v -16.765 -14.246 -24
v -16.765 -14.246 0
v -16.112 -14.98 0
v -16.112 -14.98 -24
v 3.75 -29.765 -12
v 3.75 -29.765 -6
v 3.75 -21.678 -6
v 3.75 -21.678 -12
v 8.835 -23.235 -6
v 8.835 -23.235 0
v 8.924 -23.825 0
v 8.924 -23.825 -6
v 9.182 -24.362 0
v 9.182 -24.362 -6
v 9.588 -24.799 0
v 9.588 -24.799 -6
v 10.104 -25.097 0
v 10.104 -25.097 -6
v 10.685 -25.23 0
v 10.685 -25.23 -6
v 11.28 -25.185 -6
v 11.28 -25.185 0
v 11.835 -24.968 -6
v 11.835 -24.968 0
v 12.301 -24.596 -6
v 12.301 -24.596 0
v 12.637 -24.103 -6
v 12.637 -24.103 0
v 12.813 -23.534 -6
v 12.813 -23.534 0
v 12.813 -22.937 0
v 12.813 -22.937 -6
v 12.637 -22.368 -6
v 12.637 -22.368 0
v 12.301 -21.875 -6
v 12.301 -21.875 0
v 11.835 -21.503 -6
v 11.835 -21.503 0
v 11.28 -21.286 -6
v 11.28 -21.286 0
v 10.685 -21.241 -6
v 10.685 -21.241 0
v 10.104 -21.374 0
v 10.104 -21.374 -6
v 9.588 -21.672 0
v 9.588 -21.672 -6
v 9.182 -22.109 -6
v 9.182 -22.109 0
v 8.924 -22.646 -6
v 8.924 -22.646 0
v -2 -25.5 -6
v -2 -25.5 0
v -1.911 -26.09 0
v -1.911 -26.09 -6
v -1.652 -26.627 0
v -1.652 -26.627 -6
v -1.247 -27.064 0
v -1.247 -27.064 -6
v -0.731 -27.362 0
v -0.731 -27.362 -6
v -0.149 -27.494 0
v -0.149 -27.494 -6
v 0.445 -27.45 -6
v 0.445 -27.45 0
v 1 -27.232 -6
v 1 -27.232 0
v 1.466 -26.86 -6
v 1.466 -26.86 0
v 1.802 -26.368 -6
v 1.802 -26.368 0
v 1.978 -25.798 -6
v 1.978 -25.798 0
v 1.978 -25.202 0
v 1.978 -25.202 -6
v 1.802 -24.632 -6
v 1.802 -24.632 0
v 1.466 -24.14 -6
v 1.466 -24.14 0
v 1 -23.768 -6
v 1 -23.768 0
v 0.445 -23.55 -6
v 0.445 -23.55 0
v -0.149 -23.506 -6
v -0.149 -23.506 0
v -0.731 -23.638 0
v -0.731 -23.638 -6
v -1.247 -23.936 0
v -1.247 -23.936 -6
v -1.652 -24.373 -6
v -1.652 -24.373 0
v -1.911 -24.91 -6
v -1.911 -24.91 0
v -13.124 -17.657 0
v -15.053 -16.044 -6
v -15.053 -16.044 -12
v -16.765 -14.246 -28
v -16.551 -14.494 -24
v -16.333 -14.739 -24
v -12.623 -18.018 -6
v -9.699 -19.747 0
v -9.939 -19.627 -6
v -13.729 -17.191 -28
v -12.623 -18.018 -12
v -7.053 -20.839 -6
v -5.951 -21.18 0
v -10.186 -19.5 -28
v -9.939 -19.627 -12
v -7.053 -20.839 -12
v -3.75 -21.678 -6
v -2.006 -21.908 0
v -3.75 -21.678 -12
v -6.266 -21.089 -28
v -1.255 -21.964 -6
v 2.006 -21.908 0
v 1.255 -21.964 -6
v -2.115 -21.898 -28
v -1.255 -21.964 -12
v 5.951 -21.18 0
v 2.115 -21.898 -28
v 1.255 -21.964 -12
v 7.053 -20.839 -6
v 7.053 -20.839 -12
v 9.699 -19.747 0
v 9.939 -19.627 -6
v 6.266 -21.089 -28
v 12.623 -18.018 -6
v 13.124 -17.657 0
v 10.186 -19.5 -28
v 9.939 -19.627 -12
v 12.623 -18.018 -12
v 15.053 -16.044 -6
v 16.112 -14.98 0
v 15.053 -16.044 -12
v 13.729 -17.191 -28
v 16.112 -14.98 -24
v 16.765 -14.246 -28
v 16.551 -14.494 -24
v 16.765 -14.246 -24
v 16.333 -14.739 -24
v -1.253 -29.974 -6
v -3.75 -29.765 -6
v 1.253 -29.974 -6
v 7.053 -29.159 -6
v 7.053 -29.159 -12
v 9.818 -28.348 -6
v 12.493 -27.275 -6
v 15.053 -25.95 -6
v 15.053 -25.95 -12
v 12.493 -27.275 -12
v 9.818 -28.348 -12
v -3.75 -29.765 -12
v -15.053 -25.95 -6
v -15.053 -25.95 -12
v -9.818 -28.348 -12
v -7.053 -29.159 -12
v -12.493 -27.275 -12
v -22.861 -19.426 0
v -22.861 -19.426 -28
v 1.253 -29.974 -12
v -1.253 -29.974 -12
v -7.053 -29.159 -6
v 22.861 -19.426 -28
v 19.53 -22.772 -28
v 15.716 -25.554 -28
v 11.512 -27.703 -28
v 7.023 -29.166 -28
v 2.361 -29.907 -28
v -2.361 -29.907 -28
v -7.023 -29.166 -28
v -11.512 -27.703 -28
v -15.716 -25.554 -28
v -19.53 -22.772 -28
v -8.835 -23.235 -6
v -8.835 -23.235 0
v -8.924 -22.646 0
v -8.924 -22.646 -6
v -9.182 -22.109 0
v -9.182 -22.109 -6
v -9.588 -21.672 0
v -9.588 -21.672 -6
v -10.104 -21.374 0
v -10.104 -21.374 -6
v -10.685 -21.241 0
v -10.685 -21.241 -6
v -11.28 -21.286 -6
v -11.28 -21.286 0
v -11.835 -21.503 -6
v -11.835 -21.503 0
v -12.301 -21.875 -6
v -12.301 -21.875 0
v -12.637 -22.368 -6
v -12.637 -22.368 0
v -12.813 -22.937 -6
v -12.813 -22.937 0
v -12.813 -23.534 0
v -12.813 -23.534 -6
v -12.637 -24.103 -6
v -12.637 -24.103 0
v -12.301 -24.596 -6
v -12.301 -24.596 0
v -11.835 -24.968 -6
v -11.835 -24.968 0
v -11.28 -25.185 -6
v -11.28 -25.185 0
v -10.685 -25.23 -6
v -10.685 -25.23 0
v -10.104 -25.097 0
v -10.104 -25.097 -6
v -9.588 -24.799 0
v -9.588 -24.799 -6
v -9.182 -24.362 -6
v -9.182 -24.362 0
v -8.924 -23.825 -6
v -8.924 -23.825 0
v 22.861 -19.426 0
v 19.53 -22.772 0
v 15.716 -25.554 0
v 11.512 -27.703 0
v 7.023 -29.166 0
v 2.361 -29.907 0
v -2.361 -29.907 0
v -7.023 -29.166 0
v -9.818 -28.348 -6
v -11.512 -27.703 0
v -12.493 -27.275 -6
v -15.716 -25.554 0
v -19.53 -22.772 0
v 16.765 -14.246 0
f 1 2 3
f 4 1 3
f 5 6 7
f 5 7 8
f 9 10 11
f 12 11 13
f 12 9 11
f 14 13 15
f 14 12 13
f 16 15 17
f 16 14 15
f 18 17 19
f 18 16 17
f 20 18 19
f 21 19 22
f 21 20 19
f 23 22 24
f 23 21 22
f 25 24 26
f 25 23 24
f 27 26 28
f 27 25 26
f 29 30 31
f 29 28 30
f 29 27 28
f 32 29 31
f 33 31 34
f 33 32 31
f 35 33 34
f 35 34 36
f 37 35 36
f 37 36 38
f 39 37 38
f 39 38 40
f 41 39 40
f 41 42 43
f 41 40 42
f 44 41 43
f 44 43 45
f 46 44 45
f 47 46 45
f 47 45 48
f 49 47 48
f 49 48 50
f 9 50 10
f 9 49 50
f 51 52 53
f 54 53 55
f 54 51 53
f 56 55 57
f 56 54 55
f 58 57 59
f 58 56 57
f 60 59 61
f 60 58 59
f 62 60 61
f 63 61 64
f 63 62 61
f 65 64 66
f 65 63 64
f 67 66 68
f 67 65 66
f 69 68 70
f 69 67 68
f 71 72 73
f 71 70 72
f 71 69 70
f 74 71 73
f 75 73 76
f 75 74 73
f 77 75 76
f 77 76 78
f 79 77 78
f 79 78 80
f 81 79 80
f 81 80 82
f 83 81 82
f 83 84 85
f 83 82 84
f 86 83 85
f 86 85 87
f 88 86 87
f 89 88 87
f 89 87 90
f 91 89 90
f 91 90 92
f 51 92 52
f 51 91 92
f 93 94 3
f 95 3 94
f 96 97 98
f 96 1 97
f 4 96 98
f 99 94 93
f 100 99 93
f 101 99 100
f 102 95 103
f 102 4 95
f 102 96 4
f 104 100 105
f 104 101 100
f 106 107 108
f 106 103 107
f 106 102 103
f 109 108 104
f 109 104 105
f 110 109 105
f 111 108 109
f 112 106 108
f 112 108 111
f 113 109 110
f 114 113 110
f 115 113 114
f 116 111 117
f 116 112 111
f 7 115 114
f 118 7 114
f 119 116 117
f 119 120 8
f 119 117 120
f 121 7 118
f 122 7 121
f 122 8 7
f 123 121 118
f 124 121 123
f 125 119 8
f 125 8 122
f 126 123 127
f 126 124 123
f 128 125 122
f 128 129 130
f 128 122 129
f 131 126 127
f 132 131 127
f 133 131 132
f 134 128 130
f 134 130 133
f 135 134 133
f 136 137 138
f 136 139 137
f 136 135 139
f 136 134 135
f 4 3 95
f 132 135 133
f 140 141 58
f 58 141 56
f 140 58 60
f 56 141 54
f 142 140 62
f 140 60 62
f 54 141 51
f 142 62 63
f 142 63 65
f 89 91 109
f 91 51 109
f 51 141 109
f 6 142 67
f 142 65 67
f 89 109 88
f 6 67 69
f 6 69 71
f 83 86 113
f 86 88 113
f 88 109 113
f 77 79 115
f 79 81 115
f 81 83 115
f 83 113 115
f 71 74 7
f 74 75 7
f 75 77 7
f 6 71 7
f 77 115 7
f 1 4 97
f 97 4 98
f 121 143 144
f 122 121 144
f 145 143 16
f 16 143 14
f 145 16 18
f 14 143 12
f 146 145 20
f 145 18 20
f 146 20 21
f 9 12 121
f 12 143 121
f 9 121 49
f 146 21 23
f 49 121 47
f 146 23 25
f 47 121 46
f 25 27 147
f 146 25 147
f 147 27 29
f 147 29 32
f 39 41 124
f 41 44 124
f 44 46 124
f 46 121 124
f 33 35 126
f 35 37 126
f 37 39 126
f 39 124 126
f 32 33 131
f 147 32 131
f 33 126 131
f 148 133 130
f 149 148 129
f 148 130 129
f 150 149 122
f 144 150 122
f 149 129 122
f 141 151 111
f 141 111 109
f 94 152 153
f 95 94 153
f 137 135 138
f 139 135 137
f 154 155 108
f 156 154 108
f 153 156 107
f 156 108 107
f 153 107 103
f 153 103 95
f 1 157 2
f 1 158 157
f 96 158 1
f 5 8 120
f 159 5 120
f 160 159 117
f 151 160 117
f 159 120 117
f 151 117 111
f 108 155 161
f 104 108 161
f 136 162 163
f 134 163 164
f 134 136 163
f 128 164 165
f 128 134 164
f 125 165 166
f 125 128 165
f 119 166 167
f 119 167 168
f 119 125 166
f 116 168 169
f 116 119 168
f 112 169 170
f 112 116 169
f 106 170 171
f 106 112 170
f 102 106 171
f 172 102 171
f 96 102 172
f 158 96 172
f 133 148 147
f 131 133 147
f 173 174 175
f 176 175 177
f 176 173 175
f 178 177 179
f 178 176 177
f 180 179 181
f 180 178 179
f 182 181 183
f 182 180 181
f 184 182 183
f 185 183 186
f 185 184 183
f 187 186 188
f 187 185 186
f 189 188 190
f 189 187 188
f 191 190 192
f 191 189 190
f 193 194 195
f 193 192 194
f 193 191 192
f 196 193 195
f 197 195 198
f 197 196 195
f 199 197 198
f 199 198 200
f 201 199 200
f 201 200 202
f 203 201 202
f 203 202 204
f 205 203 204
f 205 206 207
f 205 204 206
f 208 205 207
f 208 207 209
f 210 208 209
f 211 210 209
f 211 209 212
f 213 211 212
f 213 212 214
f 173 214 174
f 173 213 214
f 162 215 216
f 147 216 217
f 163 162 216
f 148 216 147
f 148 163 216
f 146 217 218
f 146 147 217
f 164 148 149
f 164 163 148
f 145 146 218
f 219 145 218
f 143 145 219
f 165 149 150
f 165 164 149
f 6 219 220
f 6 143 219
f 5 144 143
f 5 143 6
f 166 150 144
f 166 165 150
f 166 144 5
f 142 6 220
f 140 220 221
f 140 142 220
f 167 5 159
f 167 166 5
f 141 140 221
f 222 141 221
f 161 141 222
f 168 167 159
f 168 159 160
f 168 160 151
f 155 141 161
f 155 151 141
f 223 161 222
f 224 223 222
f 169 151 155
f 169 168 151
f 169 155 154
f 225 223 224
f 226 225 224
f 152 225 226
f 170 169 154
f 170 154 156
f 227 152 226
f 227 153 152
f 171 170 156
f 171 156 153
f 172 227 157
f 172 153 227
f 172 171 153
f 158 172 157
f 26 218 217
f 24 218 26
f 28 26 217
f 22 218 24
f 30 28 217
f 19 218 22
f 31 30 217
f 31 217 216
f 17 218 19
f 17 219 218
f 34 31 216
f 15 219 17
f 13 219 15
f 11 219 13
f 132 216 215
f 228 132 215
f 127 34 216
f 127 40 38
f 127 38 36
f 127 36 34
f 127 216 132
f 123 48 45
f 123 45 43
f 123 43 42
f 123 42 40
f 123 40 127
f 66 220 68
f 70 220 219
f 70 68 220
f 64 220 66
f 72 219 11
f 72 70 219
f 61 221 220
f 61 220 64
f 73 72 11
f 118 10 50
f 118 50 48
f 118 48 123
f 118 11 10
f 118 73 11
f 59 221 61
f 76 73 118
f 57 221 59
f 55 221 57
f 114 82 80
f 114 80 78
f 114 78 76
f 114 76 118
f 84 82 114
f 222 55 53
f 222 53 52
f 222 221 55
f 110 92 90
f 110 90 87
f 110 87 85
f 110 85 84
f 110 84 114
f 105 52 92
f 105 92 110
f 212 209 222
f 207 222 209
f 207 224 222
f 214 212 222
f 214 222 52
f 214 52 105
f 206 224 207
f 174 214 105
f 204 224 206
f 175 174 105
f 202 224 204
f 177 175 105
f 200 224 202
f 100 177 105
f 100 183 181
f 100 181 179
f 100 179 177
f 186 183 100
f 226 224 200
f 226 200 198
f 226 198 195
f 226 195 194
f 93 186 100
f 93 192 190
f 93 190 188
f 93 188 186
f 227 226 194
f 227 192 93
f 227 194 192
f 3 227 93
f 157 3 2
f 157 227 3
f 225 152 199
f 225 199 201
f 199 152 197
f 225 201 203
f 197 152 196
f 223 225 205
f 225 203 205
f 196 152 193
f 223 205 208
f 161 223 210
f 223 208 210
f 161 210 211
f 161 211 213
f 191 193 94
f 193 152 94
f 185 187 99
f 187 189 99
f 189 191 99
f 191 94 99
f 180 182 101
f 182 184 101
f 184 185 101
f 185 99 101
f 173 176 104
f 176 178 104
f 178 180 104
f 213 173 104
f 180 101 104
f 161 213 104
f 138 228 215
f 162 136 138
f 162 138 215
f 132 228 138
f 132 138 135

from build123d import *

# Parameters (mm, degrees)
SKETCH_1_R                = 20
SKETCH_1_R_2              = 2
EXTRUDE_1_DEPTH           = 4
EXTRUDE_START             = -4
EXTRUDE_2_DEPTH           = 4
FILLET_2_R                = 5
FILLET_3_R                = 5
SKETCH_3_R                = 58.160089131
SKETCH_3_R_2              = 39.60449563
CUT_EXTRUDE_1_DEPTH       = 4
FILLET_4_R                = 8
EXTRUDE_3_DEPTH           = 4
SKETCH_5_R                = 2
CUT_EXTRUDE_2_DEPTH       = 4
SKETCH_6_R                = 2
CUT_EXTRUDE_3_DEPTH       = 10
EXTRUDE_4_DEPTH           = 4
EXTRUDE_6_DEPTH           = 4
CUT_EXTRUDE_6_DEPTH       = 4
FILLET_6_R                = 10
FILLET_7_R                = 10
FILLET_8_R                = 10
SKETCH_11_R               = 2
EXTRUDE_7_DEPTH           = 4
SKETCH_12_R               = 54.16696545
SKETCH_12_R_2             = 30
CUT_EXTRUDE_7_DEPTH       = 4
FILLET_10_R               = 5
FILLET_11_R               = 5
SKETCH_13_R               = 2
CUT_EXTRUDE_8_DEPTH       = 4
EXTRUDE_START_2           = 28
EXTRUDE_8_DEPTH           = 28
EXTRUDE_START_3           = -28
EXTRUDE_9_DEPTH           = 28
EXTRUDE_10_DEPTH          = 4
CUT_EXTRUDE_START         = -10
SKETCH_17_R               = 2
CUT_EXTRUDE_9_DEPTH       = 10
CUT_EXTRUDE_11_DEPTH      = 35
CUT_EXTRUDE_12_DEPTH      = 36
CUT_EXTRUDE_12_DEPTH_BACK = 36
SKETCH_19_W               = 5.49642493
SKETCH_19_H               = 52.333928513
CUT_EXTRUDE_13_DEPTH      = 40


with BuildPart() as part:
    # 草图1 → 凸台-拉伸1 (new body)
    with BuildSketch(Plane.XY):
        Circle(SKETCH_1_R)
        with Locations((-15, 0)):
            Circle(SKETCH_1_R_2, mode=Mode.SUBTRACT)
        with Locations((15, 0)):
            Circle(SKETCH_1_R_2, mode=Mode.SUBTRACT)
        with Locations((-7.5, 12.990381057)):
            Circle(SKETCH_1_R_2, mode=Mode.SUBTRACT)
        with Locations((-7.5, -12.990381057)):
            Circle(SKETCH_1_R_2, mode=Mode.SUBTRACT)
        with Locations((7.5, -12.990381057)):
            Circle(SKETCH_1_R_2, mode=Mode.SUBTRACT)
        with Locations((7.5, 12.990381057)):
            Circle(SKETCH_1_R_2, mode=Mode.SUBTRACT)
    extrude(amount=EXTRUDE_1_DEPTH)

    # 草图2 → 凸台-拉伸2 (add)
    with BuildSketch(Plane.XY.offset(4).offset(EXTRUDE_START)):
        with BuildLine():
            add(Edge.make_bspline(
                [(-31.652235688, -31.652235688), (-33.388516019, -22.659494294), (-23.392443281, -20.962737075), (-16.1166561, -16.161254448), (-15.240575556, -12.950863166)],
                knots=[0, 0, 0, 0, 0.575012139, 0.86884139, 0.86884139, 0.86884139, 0.86884139], degree=3))
            ThreePointArc((-31.652235688, -31.652235688), (0, -44.76302099), (31.652235688, -31.652235688))
            add(Edge.make_bspline(
                [(31.652235688, -31.652235688), (33.388516019, -22.659494294), (23.392443281, -20.962737075), (16.1166561, -16.161254448), (15.240575556, -12.950863166)],
                knots=[0, 0, 0, 0, 0.575012139, 0.86884139, 0.86884139, 0.86884139, 0.86884139], degree=3))
            ThreePointArc((15.240575556, -12.950863166), (0, -20), (-15.240575556, -12.950863166))
        make_face()
    extrude(amount=EXTRUDE_2_DEPTH)

    # 圆角2
    fillet_2_edges = [part.edges().sort_by_distance(p)[0] for p in [
        (-31.652235688, -31.652235688, 2),
    ]]
    fillet(fillet_2_edges, radius=FILLET_2_R)

    # 圆角3
    fillet_3_edges = [part.edges().sort_by_distance(p)[0] for p in [
        (31.652235688, -31.652235688, 2),
    ]]
    fillet(fillet_3_edges, radius=FILLET_3_R)

    # 草图3 → 切除-拉伸1 (cut)
    with BuildSketch(Plane(origin=(0, 0, 0), x_dir=(-1, 0, 0), z_dir=(0, 0, -1))):
        Circle(SKETCH_3_R)
        Circle(SKETCH_3_R_2, mode=Mode.SUBTRACT)
    extrude(amount=-CUT_EXTRUDE_1_DEPTH, mode=Mode.SUBTRACT)

    # 圆角4
    fillet_4_edges = [part.edges().sort_by_distance(p)[0] for p in [
        (30.87581987, -24.803221997, 2),
        (-30.87581987, -24.803221997, 2),
    ]]
    fillet(fillet_4_edges, radius=FILLET_4_R)

    # 草图4 → 凸台-拉伸3 (add)
    with BuildSketch(Plane(origin=(0, 0, 0), x_dir=(-1, 0, 0), z_dir=(0, 0, -1))):
        with BuildLine():
            Line((-22.183787779, -32.808468935), (-22.405322857, -33.136105801))
            ThreePointArc((-22.405322857, -33.136105801), (0.038199329, -39.99998176), (22.468570811, -33.093251967))
            Line((22.468570811, -33.093251967), (22.183787779, -32.808468935))
            ThreePointArc((22.183787779, -32.808468935), (0, -39.60449563), (-22.183787779, -32.808468935))
        make_face()
    extrude(amount=-EXTRUDE_3_DEPTH)

    # 草图5 → 切除-拉伸2 (cut)
    with BuildSketch(Plane(origin=(0, 0, 0), x_dir=(-1, 0, 0), z_dir=(0, 0, -1))):
        with Locations((-15.848184815, -33.986542014)):
            Circle(SKETCH_5_R)
        with Locations((0, -37.5)):
            Circle(SKETCH_5_R)
        with Locations(Location((15.848184815, -33.986542014, 0), (0, 0, 180))):
            Circle(SKETCH_5_R)
    extrude(amount=-CUT_EXTRUDE_2_DEPTH, mode=Mode.SUBTRACT)

    # 草图6 → 切除-拉伸3 (cut)
    with BuildSketch(Plane(origin=(0, 0, 0), x_dir=(-1, 0, 0), z_dir=(0, 0, -1))):
        with Locations((0.038199329, -29.99998176)):
            Circle(SKETCH_6_R)
    extrude(amount=-CUT_EXTRUDE_3_DEPTH, mode=Mode.SUBTRACT)

    # 草图7 → 凸台-拉伸4 (add)
    with BuildSketch(Plane.XY.offset(4)):
        with BuildLine():
            Line((-22.468570811, -33.093251967), (-23.907156981, -34.531838137))
            ThreePointArc((-23.907156981, -34.531838137), (-0.231167262, -41.999363825), (23.525589, -34.792911091))
            Line((23.525589, -34.792911091), (22.405322857, -33.136105801))
            Line((22.405322857, -33.136105801), (22.183787779, -32.808468935))
            ThreePointArc((22.183787779, -32.808468935), (0, -39.60449563), (-22.183787779, -32.808468935))
            Line((-22.183787779, -32.808468935), (-22.468570811, -33.093251967))
        make_face()
    extrude(amount=-EXTRUDE_4_DEPTH)

    # 草图8 → 凸台-拉伸6 (add)
    with BuildSketch(Plane(origin=(0, 0, 0), x_dir=(-1, 0, 0), z_dir=(0, 0, -1))):
        with BuildLine():
            Line((-25.678439695, -25.558394246), (-20.516854663, -32.863070329))
            Line((-20.516854663, -32.863070329), (-23.525589, -34.792911091))
            add(Edge.make_bspline(
                [(-23.525589, -34.792911091), (-26.001835591, -30.056258517), (-25.678439695, -25.558394246)],
                knots=[0, 0, 0, 0.47951431, 0.47951431, 0.47951431], degree=2))
        make_face()
        with BuildLine():
            Line((20.516854663, -32.863070329), (23.525589, -34.792911091))
            add(Edge.make_bspline(
                [(23.525589, -34.792911091), (26.001835591, -30.056258517), (25.678439695, -25.558394246)],
                knots=[0, 0, 0, 0.47951431, 0.47951431, 0.47951431], degree=2))
            Line((25.678439695, -25.558394246), (20.516854663, -32.863070329))
        make_face()
    extrude(amount=-EXTRUDE_6_DEPTH)

    # 草图9 → 切除-拉伸6 (cut)
    with BuildSketch(Plane(origin=(0, 0, 0), x_dir=(-1, 0, 0), z_dir=(0, 0, -1))):
        Polygon((23.742659966, -34.367341122), (22.906265437, -35.20373565), (24.433492861, -34.374984505), align=None)
    extrude(amount=-CUT_EXTRUDE_6_DEPTH, mode=Mode.SUBTRACT)

    # 圆角6
    fillet_6_edges = [part.edges().sort_by_distance(p)[0] for p in [
        (23.525589, -34.792911091, 2),
    ]]
    fillet(fillet_6_edges, radius=FILLET_6_R)

    # 圆角7
    # the kernel refuses this fillet: 10 mm, written as the material it takes off along each edge
    with BuildSketch(Plane(origin=(-23.742659966, -34.367341122, 10.292446297), x_dir=(0.7071067812003878, -0.7071067811727072, 0), z_dir=(0, 0, -1))) as fillet_7_piece_1:
        with BuildLine():
            CenterArc((1.956172782, -9.970053017), FILLET_7_R, 94.435296014, 20.980736708)
            Line((-2.335706132, -0.937900705), (-2.42154371, -0.757257658))
            ThreePointArc((-2.42154371, -0.757257658), (-1.256201499, -0.248323162), (-0.06365122, 0.189600955))
            Line((-0.06365122, 0.189600955), (0, 0.2))
            ThreePointArc((0, 0.2), (0.591420243, 0.2), (1.16737384, 0.19940106))
            Line((1.16737384, 0.19940106), (1.182840486, 0))
        make_face()
    extrude(amount=16.584892581, mode=Mode.SUBTRACT)

    # 圆角8
    fillet_8_edges = [part.edges().sort_by_distance(p)[0] for p in [
        (-22.906265437, -35.20373565, 2),
    ]]
    fillet(fillet_8_edges, radius=FILLET_8_R)

    # 草图11 → 凸台-拉伸7 (add)
    with BuildSketch(Plane(origin=(0, 0, 0), x_dir=(-1, 0, 0), z_dir=(0, 0, -1))):
        with Locations((0.038199329, -29.99998176)):
            Circle(SKETCH_11_R)
        with Locations((0, -37.5)):
            Circle(SKETCH_11_R)
        with Locations((15.848184815, -33.986542014)):
            Circle(SKETCH_11_R)
        with Locations((-15.848184815, -33.986542014)):
            Circle(SKETCH_11_R)
    extrude(amount=-EXTRUDE_7_DEPTH)

    # 草图12 → 切除-拉伸7 (cut)
    with BuildSketch(Plane(origin=(0, 0, 0), x_dir=(-1, 0, 0), z_dir=(0, 0, -1))):
        Circle(SKETCH_12_R)
        Circle(SKETCH_12_R_2, mode=Mode.SUBTRACT)
    extrude(amount=-CUT_EXTRUDE_7_DEPTH, mode=Mode.SUBTRACT)

    # 圆角10
    fillet_10_edges = [part.edges().sort_by_distance(p)[0] for p in [
        (-22.533836729, -19.804701519, 2),
    ]]
    fillet(fillet_10_edges, radius=FILLET_10_R)

    # 圆角11
    fillet_11_edges = [part.edges().sort_by_distance(p)[0] for p in [
        (22.533836729, -19.804701519, 2),
    ]]
    fillet(fillet_11_edges, radius=FILLET_11_R)

    # 草图13 → 切除-拉伸8 (cut)
    with BuildSketch(Plane(origin=(0, 0, 0), x_dir=(-1, 0, 0), z_dir=(0, 0, -1))):
        with Locations((0, -25.5)):
            Circle(SKETCH_13_R)
        with Locations((-10.834875534, -23.235465565)):
            Circle(SKETCH_13_R)
        with Locations(Location((10.834875534, -23.235465565, 0), (0, 0, 180))):
            Circle(SKETCH_13_R)
    extrude(amount=-CUT_EXTRUDE_8_DEPTH, mode=Mode.SUBTRACT)

    # 草图14 → 凸台-拉伸8 (add)
    with BuildSketch(Plane(origin=(0, 0, 0), x_dir=(-1, 0, 0), z_dir=(0, 0, -1)).offset(EXTRUDE_START_2)):
        with BuildLine():
            Line((-16.764633111, -14.245949482), (-22.860863333, -19.426294749))
            ThreePointArc((-22.860863333, -19.426294749), (0, -30), (22.860863333, -19.426294749))
            Line((22.860863333, -19.426294749), (16.764633111, -14.245949482))
            ThreePointArc((16.764633111, -14.245949482), (0, -22), (-16.764633111, -14.245949482))
        make_face()
    extrude(amount=-EXTRUDE_8_DEPTH)

    # 草图15 → 凸台-拉伸9 (add)
    with BuildSketch(Plane.XY.offset(4).offset(EXTRUDE_START_3)):
        with BuildLine():
            Line((-22.860863333, -19.426294749), (-16.764633111, -14.245949482))
            Line((-16.764633111, -14.245949482), (-16.112026358, -14.980073652))
            Line((-16.112026358, -14.980073652), (-17.163654071, -24.605060027))
            ThreePointArc((-17.163654071, -24.605060027), (-20.17908325, -22.19920267), (-22.860863333, -19.426294749))
        make_face()
        with BuildLine():
            Line((16.112026358, -14.980073652), (17.163654071, -24.605060027))
            ThreePointArc((17.163654071, -24.605060027), (20.17908325, -22.19920267), (22.860863333, -19.426294749))
            Line((22.860863333, -19.426294749), (16.764633111, -14.245949482))
            Line((16.764633111, -14.245949482), (16.112026358, -14.980073652))
        make_face()
    extrude(amount=EXTRUDE_9_DEPTH)

    # 草图16 → 凸台-拉伸10 (add)
    with BuildSketch(Plane.XY.offset(4)):
        Polygon((22.860863333, -19.426294749), (12.832928653, -10.904936129), (17.846895993, -20.488091499), align=None)
        Polygon((-17.846895993, -20.488091499), (-22.860863333, -19.426294749), (-12.832928653, -10.904936129), align=None)
    extrude(amount=-EXTRUDE_10_DEPTH)

    # 草图17 → 切除-拉伸9 (cut)
    with BuildSketch(Plane.XY.offset(4).offset(CUT_EXTRUDE_START)):
        with Locations((-10.834875534, -23.235465565)):
            Circle(SKETCH_17_R)
        with Locations(Location((0, -25.5, 0), (0, 0, 180))):
            Circle(SKETCH_17_R)
        with Locations(Location((10.834875534, -23.235465565, 0), (0, 0, 180))):
            Circle(SKETCH_17_R)
    extrude(amount=CUT_EXTRUDE_9_DEPTH, mode=Mode.SUBTRACT)

    # 草图18 → 切除-拉伸11 (cut)
    with BuildSketch(Plane(origin=(0, 0, 0), x_dir=(1, 0, 0), z_dir=(0, 1, 0))):
        Polygon((13.552574472, 6), (11.552574472, 6), (8.552574472, 6), (8.552574472, 9), (11.552574472, 9), (13.552574472, 9), align=None)
        Polygon((-2, 9), (-2.5, 9), (-2.5, 6), (-2, 6), (0, 6), (2, 6), (2.5, 6), (2.5, 9), (2, 9), align=None)
        Polygon((-13.552574472, 9), (-13.552574472, 6), (-11.552574472, 6), (-8.552574472, 6), (-8.552574472, 9), (-11.552574472, 9), align=None)
    extrude(amount=-CUT_EXTRUDE_11_DEPTH, mode=Mode.SUBTRACT)

    # 草图19 → 切除-拉伸12 (cut, two sides: drawn at the far end of the back side and taken through both)
    with BuildSketch(Plane(origin=(0, 0, 0), x_dir=(0, 0, -1), z_dir=(1, 0, 0)).offset(-CUT_EXTRUDE_12_DEPTH_BACK)):
        with Locations((-2.748212465, -6.166964257)):
            Rectangle(SKETCH_19_W, SKETCH_19_H)
    extrude(amount=CUT_EXTRUDE_12_DEPTH + CUT_EXTRUDE_12_DEPTH_BACK, mode=Mode.SUBTRACT)

    # 草图20 → 切除-拉伸13 (cut)
    with BuildSketch(Plane(origin=(0, 0, 0), x_dir=(1, 0, 0), z_dir=(0, 1, 0))):
        Polygon((-7.552574472, 12), (-7.052574472, 12), (-7.052574472, 6), (-7.552574472, 6), (-14.552574472, 6), (-15.052574472, 6), (-15.052574472, 12), (-14.552574472, 12), (-13.552574472, 12), (-8.552574472, 12), align=None)
        Polygon((2.5, 6), (3.75, 6), (3.75, 12), (-3.75, 12), (-3.75, 6), align=None)
        Polygon((15.052574472, 6), (14.552574472, 6), (7.552574472, 6), (7.052574472, 6), (7.052574472, 12), (7.552574472, 12), (8.552574472, 12), (13.552574472, 12), (14.552574472, 12), (15.052574472, 12), align=None)
    extrude(amount=-CUT_EXTRUDE_13_DEPTH, mode=Mode.SUBTRACT)


solid = part.part
